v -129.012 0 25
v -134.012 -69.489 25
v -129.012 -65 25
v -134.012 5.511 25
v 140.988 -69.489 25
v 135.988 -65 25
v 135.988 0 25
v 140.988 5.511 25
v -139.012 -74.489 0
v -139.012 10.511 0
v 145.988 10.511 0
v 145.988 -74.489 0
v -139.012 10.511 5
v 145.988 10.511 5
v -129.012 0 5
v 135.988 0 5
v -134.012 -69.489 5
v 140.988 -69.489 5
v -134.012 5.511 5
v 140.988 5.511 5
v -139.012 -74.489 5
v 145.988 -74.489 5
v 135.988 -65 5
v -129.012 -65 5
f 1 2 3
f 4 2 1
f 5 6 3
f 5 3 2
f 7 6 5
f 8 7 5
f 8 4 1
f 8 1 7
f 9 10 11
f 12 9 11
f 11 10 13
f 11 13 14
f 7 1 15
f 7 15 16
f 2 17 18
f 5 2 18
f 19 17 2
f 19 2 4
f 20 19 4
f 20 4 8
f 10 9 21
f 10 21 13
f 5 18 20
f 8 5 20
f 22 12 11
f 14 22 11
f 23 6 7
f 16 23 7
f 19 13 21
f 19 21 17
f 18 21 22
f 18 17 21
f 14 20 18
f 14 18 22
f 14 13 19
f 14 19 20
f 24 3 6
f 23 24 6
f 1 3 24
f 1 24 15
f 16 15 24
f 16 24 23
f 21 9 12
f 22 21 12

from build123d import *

# Parameters (mm, degrees)
SKETCH1_W           = 285
SKETCH1_H           = 85
BOSS_EXTRUDE1_DEPTH = 5
SKETCH2_W           = 275
SKETCH2_H           = 75
BOSS_EXTRUDE2_DEPTH = 20
SKETCH3_W           = 265
SKETCH3_H           = 65
CUT_EXTRUDE1_DEPTH  = 20


with BuildPart() as part:
    # Sketch1 → Boss-Extrude1 (new body)
    with BuildSketch(Plane.XY):
        with Locations((3.487762238, -31.988636364)):
            Rectangle(SKETCH1_W, SKETCH1_H)
    extrude(amount=BOSS_EXTRUDE1_DEPTH)

    # Sketch2 → Boss-Extrude2 (add)
    with BuildSketch(Plane.XY.offset(5)):
        with Locations((3.487762238, -31.988636364)):
            Rectangle(SKETCH2_W, SKETCH2_H)
    extrude(amount=BOSS_EXTRUDE2_DEPTH)

    # Sketch3 → Cut-Extrude1 (cut)
    with BuildSketch(Plane.XY.offset(25)):
        with Locations((3.487762238, -32.5)):
            Rectangle(SKETCH3_W, SKETCH3_H)
    extrude(amount=-CUT_EXTRUDE1_DEPTH, mode=Mode.SUBTRACT)


solid = part.part
